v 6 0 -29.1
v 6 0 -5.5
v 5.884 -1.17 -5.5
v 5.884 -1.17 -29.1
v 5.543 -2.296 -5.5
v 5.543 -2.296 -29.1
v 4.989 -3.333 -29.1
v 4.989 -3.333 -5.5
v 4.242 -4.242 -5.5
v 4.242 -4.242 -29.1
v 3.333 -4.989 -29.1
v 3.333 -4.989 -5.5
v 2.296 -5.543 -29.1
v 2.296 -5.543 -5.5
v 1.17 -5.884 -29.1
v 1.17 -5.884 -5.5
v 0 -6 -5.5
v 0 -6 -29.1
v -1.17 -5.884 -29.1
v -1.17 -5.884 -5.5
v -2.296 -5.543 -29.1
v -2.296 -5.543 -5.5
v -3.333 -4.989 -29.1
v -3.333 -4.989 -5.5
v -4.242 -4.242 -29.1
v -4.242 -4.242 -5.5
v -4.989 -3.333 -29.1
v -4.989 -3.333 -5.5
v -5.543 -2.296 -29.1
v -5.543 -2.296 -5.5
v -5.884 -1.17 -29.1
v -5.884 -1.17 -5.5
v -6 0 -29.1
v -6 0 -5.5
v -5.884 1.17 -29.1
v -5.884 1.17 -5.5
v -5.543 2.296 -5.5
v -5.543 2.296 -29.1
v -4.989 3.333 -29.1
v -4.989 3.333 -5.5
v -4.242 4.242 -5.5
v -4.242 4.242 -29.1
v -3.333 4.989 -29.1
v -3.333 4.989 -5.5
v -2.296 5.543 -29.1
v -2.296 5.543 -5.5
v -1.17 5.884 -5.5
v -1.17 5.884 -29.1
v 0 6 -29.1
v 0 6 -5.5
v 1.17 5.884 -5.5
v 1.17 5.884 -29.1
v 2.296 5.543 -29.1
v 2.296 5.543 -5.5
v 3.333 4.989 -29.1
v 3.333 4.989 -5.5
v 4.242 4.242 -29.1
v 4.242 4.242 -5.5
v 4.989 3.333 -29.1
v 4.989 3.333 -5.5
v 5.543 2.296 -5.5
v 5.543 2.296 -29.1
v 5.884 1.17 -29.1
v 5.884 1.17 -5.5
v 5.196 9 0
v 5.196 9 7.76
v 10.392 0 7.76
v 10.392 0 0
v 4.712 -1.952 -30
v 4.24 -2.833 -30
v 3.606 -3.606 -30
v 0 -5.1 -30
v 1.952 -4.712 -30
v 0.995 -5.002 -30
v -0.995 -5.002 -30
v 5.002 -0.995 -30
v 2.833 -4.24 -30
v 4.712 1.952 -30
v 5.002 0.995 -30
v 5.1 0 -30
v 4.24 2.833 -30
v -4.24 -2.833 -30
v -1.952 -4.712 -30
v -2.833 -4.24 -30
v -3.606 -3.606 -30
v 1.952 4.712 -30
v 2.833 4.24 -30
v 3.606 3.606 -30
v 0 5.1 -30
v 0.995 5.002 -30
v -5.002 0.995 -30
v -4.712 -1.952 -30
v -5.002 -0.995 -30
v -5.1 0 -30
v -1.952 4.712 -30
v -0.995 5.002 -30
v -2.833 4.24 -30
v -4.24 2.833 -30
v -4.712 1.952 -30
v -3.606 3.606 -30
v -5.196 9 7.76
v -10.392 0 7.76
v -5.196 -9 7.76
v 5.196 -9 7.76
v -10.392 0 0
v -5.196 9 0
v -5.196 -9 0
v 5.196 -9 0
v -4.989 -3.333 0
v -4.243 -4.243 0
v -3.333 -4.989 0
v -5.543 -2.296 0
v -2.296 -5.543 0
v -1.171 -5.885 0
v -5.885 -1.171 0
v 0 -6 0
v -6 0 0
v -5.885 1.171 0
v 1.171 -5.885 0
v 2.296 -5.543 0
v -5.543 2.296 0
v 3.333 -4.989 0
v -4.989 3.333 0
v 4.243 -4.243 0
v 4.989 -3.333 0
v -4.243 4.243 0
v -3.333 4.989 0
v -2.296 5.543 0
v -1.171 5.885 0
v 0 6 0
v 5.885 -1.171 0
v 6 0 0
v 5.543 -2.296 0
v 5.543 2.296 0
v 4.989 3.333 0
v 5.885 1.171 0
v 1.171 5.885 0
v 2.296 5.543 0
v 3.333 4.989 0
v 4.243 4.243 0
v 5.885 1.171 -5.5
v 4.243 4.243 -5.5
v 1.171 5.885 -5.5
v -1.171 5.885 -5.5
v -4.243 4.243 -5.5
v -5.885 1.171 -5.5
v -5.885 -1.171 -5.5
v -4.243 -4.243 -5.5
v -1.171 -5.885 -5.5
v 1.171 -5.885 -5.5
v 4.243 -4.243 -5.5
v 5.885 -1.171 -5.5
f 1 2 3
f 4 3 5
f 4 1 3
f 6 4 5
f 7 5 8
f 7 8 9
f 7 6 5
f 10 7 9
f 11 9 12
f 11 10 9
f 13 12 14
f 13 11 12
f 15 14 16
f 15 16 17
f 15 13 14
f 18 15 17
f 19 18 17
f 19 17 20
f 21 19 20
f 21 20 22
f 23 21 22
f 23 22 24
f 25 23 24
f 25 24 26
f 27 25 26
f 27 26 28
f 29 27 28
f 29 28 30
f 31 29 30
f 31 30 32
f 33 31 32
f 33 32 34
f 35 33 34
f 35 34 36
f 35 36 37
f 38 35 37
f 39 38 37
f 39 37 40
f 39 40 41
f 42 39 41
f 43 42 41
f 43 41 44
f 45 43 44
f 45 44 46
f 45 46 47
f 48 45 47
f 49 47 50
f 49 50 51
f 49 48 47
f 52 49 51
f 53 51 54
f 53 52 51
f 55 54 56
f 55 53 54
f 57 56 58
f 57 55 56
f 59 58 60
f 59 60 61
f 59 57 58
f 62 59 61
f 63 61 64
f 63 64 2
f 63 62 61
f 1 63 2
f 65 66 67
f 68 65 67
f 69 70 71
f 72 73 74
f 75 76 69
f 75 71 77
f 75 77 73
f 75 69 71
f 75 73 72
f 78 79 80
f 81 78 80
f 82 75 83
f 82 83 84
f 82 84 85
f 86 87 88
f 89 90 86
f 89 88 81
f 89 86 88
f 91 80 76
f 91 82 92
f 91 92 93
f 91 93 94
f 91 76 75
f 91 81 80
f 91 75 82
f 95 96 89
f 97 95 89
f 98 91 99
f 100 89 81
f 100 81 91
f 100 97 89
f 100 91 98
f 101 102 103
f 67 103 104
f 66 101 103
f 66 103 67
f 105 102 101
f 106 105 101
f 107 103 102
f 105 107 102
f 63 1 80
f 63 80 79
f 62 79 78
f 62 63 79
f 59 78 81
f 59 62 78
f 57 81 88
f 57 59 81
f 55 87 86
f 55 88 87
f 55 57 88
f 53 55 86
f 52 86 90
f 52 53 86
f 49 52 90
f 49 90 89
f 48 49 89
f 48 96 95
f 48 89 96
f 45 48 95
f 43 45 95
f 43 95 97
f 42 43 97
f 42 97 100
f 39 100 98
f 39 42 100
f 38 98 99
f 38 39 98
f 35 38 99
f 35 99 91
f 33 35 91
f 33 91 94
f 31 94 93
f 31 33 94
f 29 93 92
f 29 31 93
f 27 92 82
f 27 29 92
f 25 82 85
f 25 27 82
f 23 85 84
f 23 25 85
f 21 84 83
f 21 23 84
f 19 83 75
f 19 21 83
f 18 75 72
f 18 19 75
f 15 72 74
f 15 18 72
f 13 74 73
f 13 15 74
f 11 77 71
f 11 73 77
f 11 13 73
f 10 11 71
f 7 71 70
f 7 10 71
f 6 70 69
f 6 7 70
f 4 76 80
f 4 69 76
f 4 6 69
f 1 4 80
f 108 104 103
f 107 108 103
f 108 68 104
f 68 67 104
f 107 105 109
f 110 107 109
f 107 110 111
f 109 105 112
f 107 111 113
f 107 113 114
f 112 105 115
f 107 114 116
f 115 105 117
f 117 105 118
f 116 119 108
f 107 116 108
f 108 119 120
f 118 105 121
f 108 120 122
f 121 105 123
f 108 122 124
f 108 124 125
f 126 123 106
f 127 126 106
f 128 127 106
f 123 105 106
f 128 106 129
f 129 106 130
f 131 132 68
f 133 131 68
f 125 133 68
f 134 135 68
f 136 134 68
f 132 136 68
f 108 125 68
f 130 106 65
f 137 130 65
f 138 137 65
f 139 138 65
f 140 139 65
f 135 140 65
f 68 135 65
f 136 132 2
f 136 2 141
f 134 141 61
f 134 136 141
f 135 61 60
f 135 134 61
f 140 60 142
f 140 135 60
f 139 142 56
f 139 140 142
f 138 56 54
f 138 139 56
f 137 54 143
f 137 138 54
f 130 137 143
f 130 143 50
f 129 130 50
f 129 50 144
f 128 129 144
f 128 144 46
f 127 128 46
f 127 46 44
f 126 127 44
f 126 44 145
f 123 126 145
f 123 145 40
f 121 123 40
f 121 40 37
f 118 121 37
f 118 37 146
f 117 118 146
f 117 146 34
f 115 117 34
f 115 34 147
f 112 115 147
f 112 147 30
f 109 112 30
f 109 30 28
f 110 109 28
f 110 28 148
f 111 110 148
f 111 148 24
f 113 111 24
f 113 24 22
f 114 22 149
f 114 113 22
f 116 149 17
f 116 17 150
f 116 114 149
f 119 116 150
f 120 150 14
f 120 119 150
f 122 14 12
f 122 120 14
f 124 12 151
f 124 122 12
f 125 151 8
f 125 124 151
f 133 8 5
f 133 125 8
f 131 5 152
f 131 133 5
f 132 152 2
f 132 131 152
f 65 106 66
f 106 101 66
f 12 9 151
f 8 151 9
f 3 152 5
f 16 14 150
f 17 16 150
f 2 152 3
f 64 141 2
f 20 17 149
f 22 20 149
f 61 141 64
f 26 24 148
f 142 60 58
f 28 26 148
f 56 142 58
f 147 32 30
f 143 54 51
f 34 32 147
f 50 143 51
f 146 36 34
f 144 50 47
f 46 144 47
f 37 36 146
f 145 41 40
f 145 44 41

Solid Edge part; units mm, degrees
sketch "Sketch1" plane through (0, 0, 0) normal (0, 0, 1) x (1, 0, 0)
  circle A0 centre (0, 0) radius 10.44
  dimension "D1" = 20.88
extrude "Protrusion1" add sketch "Sketch1" along normal blind 7.76
sketch "Sketch2" plane through (0, 0, 0) normal (0, 0, -1) x (1, 0, 0)
  circle A0 centre (0, 0) radius 6
extrude "Protrusion2" add sketch "Sketch2" along normal blind 30
sketch "Sketch3" plane through (0, 0, -30) normal (0, 0, -1) x (1, 0, 0)
  circle A0 centre (0, 0) radius 5.9997
extrude "Cutout1" cut sketch "Sketch3" against normal blind 24.5 flip side to cut
chamfer "Chamfer_1" distance 0.9 angle 45 1 edges at (-5.9997, 0, -30)
sketch "Sketch4" plane through (0, 0, 7.76) normal (0, 0, 1) x (1, 0, 0)
  line L0 (-5.2909, 9) -> (5.2909, 9)
  dimension "D1" = 18
extrude "Cutout2" cut sketch "Sketch4" against normal up to next material side at (0, 9.05, 7.76)
pattern_circular "Pattern1" count 6 over 360 about axis through (0, 0, 7.76) along (0, 0, 1) of "Cutout2"
properties part number "118876" material "Stainless Steel, 304"
